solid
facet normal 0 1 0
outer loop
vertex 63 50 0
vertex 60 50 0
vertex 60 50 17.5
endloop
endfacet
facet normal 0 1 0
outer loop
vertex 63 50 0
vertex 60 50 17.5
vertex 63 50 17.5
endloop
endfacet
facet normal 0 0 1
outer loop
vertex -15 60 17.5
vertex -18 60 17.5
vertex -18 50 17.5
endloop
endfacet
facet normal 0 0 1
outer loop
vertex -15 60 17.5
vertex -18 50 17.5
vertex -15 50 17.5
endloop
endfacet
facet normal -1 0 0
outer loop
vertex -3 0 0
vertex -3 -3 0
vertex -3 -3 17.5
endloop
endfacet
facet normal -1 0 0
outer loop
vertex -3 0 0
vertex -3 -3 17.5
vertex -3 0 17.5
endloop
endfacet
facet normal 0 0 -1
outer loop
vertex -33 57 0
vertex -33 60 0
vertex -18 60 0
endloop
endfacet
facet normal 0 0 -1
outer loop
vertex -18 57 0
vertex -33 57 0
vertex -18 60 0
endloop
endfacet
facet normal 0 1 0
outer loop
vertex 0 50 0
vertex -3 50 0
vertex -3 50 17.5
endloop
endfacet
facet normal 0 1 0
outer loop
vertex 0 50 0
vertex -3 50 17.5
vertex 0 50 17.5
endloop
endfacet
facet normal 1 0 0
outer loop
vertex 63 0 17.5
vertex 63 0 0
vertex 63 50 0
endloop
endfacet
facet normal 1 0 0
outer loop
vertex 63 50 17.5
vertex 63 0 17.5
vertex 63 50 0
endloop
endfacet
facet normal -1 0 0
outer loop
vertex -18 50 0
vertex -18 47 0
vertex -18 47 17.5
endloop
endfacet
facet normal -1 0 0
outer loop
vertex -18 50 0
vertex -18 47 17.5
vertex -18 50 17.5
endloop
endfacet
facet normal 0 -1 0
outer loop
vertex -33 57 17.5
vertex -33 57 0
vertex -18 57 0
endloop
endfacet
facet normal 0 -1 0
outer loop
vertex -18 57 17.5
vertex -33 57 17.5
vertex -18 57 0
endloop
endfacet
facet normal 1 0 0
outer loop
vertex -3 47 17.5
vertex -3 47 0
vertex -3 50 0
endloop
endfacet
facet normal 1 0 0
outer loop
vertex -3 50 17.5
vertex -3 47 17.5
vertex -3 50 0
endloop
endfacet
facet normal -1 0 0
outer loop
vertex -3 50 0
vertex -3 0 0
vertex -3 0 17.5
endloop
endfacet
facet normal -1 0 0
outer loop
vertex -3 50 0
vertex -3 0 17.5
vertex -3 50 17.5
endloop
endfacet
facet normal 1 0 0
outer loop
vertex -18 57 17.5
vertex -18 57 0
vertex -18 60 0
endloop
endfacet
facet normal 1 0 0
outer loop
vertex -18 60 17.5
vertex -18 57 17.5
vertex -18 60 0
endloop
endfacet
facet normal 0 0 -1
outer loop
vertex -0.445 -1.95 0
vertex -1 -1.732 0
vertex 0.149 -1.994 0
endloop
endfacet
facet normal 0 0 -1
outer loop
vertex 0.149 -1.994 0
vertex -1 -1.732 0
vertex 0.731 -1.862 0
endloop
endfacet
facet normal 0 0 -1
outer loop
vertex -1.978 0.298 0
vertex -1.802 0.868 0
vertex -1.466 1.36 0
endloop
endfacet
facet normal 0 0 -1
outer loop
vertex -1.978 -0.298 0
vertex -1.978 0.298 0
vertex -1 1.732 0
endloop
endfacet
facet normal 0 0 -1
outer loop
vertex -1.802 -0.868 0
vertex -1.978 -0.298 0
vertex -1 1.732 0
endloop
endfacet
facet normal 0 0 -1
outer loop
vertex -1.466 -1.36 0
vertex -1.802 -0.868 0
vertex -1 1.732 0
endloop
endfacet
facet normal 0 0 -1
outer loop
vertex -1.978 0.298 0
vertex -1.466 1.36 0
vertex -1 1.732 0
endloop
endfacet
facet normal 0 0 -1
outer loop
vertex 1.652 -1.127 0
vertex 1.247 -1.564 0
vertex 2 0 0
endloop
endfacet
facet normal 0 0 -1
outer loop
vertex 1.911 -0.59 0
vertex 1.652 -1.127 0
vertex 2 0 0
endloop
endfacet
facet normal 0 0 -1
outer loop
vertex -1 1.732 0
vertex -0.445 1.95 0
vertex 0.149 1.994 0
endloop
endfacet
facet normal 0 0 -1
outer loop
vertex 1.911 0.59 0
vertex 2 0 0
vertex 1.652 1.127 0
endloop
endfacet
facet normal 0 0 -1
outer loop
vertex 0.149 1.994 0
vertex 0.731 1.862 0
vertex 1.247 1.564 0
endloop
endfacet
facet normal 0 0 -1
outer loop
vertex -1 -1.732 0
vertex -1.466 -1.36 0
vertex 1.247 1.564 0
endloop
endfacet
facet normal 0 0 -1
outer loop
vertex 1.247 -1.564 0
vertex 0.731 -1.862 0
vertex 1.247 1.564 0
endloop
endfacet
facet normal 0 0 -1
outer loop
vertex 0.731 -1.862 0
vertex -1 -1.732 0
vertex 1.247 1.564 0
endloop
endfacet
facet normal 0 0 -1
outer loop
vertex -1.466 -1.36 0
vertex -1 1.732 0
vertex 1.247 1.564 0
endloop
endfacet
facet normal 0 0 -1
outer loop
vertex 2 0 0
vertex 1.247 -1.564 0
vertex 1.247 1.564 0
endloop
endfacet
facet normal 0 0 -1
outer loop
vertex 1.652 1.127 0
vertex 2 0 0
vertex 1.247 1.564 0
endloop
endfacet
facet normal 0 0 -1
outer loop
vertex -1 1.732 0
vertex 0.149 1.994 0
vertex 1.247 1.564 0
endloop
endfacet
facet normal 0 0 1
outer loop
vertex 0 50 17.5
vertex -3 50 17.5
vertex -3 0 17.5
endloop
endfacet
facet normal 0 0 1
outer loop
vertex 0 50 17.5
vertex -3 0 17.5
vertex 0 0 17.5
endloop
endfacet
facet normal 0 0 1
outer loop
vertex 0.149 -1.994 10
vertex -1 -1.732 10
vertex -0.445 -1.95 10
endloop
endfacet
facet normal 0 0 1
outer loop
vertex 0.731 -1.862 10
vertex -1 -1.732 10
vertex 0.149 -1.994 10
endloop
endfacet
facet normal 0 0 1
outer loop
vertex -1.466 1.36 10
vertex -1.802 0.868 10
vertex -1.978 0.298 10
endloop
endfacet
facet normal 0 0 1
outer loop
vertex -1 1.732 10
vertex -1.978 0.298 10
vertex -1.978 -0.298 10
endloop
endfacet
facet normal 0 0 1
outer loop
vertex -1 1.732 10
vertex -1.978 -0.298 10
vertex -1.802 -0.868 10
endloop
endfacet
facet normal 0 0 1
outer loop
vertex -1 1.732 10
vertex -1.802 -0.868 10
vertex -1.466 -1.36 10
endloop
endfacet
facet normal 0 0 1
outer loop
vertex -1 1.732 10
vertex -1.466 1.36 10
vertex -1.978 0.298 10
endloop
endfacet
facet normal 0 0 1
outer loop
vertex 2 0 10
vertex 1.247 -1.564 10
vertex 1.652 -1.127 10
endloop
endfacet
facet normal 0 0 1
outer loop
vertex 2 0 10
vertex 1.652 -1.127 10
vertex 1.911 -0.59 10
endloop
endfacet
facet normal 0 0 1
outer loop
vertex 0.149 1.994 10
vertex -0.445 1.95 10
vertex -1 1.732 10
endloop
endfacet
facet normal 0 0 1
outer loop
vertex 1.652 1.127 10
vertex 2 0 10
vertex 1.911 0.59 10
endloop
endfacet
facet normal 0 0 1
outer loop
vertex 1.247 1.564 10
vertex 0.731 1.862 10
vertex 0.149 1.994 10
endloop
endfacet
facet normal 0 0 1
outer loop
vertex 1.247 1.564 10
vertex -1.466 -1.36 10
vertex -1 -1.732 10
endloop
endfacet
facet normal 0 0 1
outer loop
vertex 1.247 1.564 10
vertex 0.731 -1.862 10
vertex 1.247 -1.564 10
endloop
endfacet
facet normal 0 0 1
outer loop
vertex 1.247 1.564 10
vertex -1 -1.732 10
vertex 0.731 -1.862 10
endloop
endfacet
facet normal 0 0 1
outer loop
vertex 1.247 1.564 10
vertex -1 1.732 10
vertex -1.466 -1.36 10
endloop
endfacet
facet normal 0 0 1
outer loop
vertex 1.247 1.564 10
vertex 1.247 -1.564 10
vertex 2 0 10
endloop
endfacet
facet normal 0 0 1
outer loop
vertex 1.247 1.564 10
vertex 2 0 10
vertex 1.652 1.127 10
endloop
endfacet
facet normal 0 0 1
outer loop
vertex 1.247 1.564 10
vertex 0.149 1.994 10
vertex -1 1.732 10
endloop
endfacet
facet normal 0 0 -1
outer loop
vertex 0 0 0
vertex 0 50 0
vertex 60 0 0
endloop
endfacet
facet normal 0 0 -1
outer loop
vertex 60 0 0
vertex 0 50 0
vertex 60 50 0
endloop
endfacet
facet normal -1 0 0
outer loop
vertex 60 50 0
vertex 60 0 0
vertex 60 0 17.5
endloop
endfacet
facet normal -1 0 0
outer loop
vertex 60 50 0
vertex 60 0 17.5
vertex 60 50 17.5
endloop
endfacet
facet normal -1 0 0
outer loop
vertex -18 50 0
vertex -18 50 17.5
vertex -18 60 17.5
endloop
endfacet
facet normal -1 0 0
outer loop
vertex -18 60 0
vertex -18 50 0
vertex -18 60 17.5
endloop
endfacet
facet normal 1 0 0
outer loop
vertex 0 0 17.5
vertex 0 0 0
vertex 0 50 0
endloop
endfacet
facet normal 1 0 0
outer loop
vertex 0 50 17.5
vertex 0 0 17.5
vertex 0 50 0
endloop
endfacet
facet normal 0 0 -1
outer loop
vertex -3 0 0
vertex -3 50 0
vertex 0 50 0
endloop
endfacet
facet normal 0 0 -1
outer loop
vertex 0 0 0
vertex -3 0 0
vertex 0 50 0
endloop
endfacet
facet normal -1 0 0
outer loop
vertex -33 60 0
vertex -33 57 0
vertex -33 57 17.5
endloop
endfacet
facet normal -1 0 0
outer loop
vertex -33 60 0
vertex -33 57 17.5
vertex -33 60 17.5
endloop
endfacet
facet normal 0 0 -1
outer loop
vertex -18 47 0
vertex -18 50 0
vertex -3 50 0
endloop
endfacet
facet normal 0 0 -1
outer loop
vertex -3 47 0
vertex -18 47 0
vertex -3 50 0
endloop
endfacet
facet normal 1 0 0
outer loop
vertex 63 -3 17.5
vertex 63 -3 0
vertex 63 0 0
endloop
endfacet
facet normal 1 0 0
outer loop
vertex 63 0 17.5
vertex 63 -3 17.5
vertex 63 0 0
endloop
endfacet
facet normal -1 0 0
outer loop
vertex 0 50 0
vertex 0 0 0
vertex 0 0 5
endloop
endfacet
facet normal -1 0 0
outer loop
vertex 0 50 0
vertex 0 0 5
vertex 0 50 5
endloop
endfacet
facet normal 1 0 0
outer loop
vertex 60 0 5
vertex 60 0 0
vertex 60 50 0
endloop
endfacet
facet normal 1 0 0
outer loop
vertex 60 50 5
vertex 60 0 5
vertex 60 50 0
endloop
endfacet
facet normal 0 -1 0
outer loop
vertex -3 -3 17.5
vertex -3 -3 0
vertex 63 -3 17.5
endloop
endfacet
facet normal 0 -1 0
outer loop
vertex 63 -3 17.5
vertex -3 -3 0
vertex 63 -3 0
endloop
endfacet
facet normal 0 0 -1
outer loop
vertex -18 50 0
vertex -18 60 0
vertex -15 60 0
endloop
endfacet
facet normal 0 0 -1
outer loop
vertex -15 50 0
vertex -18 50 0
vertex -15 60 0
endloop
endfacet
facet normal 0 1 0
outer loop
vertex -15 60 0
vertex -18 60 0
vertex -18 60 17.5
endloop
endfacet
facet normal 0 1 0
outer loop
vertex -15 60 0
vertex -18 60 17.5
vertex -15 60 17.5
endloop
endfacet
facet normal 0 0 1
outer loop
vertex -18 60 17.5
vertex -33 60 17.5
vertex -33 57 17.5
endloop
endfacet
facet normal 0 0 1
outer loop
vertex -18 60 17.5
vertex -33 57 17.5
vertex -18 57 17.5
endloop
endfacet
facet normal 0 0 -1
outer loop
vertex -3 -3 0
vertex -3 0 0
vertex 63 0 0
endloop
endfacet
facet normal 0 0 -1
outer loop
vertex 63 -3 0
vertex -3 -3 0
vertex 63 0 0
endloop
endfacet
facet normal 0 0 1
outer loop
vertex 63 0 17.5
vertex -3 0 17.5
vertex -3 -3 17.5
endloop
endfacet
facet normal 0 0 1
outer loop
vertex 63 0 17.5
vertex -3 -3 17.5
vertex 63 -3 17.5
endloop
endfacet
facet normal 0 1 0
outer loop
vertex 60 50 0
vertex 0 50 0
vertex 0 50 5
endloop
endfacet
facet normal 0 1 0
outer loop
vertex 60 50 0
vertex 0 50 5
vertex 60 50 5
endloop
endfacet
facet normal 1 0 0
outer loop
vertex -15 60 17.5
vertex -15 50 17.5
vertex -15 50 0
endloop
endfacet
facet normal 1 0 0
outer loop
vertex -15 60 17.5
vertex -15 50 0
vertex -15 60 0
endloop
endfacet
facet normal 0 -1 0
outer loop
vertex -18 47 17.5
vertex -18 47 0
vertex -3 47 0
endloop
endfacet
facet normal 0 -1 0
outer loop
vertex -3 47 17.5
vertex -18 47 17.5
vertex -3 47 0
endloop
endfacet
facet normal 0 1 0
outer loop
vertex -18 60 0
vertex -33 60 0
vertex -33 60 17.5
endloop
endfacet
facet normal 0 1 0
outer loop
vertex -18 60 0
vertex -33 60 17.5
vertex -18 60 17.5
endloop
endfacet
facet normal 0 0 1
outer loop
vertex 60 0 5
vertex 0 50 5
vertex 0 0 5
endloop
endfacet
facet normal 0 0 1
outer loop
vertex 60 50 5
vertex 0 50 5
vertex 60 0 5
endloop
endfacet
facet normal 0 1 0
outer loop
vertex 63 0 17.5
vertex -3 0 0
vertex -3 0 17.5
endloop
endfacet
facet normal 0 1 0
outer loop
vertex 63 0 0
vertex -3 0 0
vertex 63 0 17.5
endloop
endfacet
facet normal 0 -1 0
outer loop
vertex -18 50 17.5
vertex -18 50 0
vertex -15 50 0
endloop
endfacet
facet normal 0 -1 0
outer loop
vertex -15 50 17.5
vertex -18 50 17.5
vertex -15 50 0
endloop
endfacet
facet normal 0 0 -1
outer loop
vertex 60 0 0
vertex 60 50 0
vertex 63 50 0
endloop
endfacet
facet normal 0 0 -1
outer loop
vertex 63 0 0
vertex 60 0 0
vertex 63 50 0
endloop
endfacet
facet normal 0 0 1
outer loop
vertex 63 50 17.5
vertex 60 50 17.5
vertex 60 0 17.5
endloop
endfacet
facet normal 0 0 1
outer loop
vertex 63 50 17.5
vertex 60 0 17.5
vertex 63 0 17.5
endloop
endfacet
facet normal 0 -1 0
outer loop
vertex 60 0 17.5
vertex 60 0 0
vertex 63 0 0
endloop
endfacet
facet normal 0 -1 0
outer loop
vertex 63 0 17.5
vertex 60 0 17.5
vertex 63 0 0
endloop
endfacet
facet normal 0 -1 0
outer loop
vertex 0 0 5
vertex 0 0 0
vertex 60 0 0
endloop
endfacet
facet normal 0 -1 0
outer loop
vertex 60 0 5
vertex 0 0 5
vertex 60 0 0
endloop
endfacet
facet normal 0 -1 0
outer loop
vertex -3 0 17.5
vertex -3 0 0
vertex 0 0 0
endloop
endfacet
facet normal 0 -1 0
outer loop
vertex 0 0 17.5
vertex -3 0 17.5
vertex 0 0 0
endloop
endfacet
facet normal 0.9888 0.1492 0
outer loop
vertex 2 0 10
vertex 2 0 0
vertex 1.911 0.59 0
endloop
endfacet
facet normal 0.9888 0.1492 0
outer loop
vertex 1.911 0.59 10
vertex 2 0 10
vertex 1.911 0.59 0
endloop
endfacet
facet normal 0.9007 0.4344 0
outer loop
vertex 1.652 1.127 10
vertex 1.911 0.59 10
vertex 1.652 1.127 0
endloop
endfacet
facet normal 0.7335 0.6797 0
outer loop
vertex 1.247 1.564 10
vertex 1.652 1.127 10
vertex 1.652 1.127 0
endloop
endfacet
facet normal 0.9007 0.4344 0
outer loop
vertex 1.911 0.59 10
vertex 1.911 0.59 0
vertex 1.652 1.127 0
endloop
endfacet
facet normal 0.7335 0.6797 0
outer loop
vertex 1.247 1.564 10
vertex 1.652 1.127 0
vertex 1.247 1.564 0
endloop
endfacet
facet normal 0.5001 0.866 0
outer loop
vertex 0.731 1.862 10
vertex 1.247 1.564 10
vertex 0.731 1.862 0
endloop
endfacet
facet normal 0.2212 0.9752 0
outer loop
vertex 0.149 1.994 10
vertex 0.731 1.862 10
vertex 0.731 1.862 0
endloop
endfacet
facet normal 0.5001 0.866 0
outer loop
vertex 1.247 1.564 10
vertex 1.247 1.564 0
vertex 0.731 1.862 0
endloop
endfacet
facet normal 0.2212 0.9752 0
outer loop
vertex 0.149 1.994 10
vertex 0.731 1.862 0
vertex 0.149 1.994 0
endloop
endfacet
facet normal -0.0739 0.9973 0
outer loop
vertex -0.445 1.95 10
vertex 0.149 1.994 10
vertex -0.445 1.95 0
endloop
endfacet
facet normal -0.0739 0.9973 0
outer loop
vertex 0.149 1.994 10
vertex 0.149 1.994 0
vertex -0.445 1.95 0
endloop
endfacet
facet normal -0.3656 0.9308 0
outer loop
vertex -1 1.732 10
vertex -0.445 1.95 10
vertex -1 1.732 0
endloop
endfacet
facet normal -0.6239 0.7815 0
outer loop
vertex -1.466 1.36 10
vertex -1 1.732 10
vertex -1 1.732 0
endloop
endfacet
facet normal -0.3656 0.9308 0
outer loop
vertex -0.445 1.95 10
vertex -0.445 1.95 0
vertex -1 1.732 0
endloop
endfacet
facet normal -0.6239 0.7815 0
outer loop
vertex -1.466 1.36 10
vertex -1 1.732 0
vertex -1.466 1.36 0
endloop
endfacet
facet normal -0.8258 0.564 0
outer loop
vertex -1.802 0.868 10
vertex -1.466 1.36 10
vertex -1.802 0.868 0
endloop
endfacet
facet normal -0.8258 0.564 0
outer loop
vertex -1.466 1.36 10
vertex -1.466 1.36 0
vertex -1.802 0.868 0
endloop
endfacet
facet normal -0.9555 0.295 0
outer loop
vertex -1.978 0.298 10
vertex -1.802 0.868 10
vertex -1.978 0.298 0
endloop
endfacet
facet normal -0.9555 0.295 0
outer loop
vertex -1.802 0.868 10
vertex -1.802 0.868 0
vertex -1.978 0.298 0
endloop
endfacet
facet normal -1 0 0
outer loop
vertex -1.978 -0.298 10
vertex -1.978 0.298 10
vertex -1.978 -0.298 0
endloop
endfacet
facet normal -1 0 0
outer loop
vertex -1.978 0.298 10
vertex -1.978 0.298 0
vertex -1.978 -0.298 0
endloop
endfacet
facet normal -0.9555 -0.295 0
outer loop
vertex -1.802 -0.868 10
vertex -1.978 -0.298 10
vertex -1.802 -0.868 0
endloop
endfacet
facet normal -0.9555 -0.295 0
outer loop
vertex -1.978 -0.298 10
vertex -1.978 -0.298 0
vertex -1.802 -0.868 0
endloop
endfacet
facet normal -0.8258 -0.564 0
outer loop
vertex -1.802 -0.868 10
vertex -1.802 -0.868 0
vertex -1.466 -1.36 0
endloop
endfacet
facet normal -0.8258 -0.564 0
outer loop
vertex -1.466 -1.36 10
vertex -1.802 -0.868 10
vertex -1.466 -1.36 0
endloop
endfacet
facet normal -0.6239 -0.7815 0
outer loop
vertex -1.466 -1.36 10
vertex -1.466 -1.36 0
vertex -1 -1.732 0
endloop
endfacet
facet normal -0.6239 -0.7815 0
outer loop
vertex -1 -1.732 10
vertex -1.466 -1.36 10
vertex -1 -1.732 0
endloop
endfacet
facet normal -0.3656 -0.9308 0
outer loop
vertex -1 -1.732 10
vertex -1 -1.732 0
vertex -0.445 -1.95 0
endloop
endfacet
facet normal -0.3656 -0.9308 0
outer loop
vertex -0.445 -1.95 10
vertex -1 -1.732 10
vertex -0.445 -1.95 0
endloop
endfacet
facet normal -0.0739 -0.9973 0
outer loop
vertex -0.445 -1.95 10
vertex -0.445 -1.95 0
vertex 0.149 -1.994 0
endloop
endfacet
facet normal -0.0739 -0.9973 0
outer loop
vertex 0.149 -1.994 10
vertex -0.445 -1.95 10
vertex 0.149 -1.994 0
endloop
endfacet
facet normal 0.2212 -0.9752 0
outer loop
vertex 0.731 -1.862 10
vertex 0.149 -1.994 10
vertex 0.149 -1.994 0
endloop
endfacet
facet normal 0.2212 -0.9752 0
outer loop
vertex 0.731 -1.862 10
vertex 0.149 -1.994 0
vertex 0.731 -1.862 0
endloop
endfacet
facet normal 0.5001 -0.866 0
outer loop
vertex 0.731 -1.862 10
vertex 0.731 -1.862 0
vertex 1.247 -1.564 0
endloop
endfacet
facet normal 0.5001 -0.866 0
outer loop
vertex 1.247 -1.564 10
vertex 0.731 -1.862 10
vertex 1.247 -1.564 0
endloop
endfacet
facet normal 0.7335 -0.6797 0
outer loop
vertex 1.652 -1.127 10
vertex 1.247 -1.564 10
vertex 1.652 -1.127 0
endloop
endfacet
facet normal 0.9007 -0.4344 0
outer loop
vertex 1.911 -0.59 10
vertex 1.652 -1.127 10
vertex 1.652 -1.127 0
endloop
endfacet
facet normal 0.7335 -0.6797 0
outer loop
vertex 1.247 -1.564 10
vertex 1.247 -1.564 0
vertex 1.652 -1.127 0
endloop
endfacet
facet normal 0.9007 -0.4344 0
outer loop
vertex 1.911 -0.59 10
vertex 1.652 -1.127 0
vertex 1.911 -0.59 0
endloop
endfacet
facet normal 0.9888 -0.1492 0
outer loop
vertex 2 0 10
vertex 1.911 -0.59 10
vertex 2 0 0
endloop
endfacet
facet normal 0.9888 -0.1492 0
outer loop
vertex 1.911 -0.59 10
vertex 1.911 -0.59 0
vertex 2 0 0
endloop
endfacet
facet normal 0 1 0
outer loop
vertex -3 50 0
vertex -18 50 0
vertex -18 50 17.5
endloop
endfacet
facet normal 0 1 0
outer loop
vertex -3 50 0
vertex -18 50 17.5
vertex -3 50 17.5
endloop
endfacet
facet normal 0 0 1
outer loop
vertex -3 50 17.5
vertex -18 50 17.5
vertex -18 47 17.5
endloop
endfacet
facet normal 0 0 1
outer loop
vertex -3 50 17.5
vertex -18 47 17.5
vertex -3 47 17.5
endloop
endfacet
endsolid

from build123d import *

# Parameters (mm, degrees)
BOX_W          = 60
BOX_H          = 50
BOX_DEPTH      = 5
BOX001_W       = 3
BOX001_H       = 50
BOX001_DEPTH   = 17.5
BOX002_W       = 3
BOX002_H       = 50
BOX002_DEPTH   = 17.5
BOX003_W       = 15
BOX003_H       = 3
BOX003_DEPTH   = 17.5
BOX004_W       = 66
BOX004_H       = 3
BOX004_DEPTH   = 17.5
BOX005_W       = 3
BOX005_H       = 10
BOX005_DEPTH   = 17.5
BOX006_W       = 15
BOX006_H       = 3
BOX006_DEPTH   = 17.5
CYLINDER_R     = 2
CYLINDER_DEPTH = 10


with BuildPart() as base:
    # Box → Box (new body)
    with BuildSketch(Plane.XY):
        with Locations((30, 25)):
            Rectangle(BOX_W, BOX_H)
    extrude(amount=BOX_DEPTH)


with BuildPart() as box001:
    # Box001 → Box001 (new body)
    with BuildSketch(Plane(origin=(60, 0, 0), x_dir=(1, 0, 0), z_dir=(0, 0, 1))):
        with Locations((1.5, 25)):
            Rectangle(BOX001_W, BOX001_H)
    extrude(amount=BOX001_DEPTH)


with BuildPart() as box002:
    # Box002 → Box002 (new body)
    with BuildSketch(Plane(origin=(-3, 0, 0), x_dir=(1, 0, 0), z_dir=(0, 0, 1))):
        with Locations((1.5, 25)):
            Rectangle(BOX002_W, BOX002_H)
    extrude(amount=BOX002_DEPTH)


with BuildPart() as box003:
    # Box003 → Box003 (new body)
    with BuildSketch(Plane(origin=(-18, 47, 0), x_dir=(1, 0, 0), z_dir=(0, 0, 1))):
        with Locations((7.5, 1.5)):
            Rectangle(BOX003_W, BOX003_H)
    extrude(amount=BOX003_DEPTH)


with BuildPart() as box004:
    # Box004 → Box004 (new body)
    with BuildSketch(Plane(origin=(-3, -3, 0), x_dir=(1, 0, 0), z_dir=(0, 0, 1))):
        with Locations((33, 1.5)):
            Rectangle(BOX004_W, BOX004_H)
    extrude(amount=BOX004_DEPTH)


with BuildPart() as box005:
    # Box005 → Box005 (new body)
    with BuildSketch(Plane(origin=(-18, 50, 0), x_dir=(1, 0, 0), z_dir=(0, 0, 1))):
        with Locations((1.5, 5)):
            Rectangle(BOX005_W, BOX005_H)
    extrude(amount=BOX005_DEPTH)


with BuildPart() as box006:
    # Box006 → Box006 (new body)
    with BuildSketch(Plane(origin=(-33, 57, 0), x_dir=(1, 0, 0), z_dir=(0, 0, 1))):
        with Locations((7.5, 1.5)):
            Rectangle(BOX006_W, BOX006_H)
    extrude(amount=BOX006_DEPTH)


with BuildPart() as cylinder:
    # Cylinder → Cylinder (new body)
    with BuildSketch(Plane.XY):
        Circle(CYLINDER_R)
    extrude(amount=CYLINDER_DEPTH)


solid = Compound([base.part, box001.part, box002.part, box003.part, box004.part, box005.part, box006.part, cylinder.part])
